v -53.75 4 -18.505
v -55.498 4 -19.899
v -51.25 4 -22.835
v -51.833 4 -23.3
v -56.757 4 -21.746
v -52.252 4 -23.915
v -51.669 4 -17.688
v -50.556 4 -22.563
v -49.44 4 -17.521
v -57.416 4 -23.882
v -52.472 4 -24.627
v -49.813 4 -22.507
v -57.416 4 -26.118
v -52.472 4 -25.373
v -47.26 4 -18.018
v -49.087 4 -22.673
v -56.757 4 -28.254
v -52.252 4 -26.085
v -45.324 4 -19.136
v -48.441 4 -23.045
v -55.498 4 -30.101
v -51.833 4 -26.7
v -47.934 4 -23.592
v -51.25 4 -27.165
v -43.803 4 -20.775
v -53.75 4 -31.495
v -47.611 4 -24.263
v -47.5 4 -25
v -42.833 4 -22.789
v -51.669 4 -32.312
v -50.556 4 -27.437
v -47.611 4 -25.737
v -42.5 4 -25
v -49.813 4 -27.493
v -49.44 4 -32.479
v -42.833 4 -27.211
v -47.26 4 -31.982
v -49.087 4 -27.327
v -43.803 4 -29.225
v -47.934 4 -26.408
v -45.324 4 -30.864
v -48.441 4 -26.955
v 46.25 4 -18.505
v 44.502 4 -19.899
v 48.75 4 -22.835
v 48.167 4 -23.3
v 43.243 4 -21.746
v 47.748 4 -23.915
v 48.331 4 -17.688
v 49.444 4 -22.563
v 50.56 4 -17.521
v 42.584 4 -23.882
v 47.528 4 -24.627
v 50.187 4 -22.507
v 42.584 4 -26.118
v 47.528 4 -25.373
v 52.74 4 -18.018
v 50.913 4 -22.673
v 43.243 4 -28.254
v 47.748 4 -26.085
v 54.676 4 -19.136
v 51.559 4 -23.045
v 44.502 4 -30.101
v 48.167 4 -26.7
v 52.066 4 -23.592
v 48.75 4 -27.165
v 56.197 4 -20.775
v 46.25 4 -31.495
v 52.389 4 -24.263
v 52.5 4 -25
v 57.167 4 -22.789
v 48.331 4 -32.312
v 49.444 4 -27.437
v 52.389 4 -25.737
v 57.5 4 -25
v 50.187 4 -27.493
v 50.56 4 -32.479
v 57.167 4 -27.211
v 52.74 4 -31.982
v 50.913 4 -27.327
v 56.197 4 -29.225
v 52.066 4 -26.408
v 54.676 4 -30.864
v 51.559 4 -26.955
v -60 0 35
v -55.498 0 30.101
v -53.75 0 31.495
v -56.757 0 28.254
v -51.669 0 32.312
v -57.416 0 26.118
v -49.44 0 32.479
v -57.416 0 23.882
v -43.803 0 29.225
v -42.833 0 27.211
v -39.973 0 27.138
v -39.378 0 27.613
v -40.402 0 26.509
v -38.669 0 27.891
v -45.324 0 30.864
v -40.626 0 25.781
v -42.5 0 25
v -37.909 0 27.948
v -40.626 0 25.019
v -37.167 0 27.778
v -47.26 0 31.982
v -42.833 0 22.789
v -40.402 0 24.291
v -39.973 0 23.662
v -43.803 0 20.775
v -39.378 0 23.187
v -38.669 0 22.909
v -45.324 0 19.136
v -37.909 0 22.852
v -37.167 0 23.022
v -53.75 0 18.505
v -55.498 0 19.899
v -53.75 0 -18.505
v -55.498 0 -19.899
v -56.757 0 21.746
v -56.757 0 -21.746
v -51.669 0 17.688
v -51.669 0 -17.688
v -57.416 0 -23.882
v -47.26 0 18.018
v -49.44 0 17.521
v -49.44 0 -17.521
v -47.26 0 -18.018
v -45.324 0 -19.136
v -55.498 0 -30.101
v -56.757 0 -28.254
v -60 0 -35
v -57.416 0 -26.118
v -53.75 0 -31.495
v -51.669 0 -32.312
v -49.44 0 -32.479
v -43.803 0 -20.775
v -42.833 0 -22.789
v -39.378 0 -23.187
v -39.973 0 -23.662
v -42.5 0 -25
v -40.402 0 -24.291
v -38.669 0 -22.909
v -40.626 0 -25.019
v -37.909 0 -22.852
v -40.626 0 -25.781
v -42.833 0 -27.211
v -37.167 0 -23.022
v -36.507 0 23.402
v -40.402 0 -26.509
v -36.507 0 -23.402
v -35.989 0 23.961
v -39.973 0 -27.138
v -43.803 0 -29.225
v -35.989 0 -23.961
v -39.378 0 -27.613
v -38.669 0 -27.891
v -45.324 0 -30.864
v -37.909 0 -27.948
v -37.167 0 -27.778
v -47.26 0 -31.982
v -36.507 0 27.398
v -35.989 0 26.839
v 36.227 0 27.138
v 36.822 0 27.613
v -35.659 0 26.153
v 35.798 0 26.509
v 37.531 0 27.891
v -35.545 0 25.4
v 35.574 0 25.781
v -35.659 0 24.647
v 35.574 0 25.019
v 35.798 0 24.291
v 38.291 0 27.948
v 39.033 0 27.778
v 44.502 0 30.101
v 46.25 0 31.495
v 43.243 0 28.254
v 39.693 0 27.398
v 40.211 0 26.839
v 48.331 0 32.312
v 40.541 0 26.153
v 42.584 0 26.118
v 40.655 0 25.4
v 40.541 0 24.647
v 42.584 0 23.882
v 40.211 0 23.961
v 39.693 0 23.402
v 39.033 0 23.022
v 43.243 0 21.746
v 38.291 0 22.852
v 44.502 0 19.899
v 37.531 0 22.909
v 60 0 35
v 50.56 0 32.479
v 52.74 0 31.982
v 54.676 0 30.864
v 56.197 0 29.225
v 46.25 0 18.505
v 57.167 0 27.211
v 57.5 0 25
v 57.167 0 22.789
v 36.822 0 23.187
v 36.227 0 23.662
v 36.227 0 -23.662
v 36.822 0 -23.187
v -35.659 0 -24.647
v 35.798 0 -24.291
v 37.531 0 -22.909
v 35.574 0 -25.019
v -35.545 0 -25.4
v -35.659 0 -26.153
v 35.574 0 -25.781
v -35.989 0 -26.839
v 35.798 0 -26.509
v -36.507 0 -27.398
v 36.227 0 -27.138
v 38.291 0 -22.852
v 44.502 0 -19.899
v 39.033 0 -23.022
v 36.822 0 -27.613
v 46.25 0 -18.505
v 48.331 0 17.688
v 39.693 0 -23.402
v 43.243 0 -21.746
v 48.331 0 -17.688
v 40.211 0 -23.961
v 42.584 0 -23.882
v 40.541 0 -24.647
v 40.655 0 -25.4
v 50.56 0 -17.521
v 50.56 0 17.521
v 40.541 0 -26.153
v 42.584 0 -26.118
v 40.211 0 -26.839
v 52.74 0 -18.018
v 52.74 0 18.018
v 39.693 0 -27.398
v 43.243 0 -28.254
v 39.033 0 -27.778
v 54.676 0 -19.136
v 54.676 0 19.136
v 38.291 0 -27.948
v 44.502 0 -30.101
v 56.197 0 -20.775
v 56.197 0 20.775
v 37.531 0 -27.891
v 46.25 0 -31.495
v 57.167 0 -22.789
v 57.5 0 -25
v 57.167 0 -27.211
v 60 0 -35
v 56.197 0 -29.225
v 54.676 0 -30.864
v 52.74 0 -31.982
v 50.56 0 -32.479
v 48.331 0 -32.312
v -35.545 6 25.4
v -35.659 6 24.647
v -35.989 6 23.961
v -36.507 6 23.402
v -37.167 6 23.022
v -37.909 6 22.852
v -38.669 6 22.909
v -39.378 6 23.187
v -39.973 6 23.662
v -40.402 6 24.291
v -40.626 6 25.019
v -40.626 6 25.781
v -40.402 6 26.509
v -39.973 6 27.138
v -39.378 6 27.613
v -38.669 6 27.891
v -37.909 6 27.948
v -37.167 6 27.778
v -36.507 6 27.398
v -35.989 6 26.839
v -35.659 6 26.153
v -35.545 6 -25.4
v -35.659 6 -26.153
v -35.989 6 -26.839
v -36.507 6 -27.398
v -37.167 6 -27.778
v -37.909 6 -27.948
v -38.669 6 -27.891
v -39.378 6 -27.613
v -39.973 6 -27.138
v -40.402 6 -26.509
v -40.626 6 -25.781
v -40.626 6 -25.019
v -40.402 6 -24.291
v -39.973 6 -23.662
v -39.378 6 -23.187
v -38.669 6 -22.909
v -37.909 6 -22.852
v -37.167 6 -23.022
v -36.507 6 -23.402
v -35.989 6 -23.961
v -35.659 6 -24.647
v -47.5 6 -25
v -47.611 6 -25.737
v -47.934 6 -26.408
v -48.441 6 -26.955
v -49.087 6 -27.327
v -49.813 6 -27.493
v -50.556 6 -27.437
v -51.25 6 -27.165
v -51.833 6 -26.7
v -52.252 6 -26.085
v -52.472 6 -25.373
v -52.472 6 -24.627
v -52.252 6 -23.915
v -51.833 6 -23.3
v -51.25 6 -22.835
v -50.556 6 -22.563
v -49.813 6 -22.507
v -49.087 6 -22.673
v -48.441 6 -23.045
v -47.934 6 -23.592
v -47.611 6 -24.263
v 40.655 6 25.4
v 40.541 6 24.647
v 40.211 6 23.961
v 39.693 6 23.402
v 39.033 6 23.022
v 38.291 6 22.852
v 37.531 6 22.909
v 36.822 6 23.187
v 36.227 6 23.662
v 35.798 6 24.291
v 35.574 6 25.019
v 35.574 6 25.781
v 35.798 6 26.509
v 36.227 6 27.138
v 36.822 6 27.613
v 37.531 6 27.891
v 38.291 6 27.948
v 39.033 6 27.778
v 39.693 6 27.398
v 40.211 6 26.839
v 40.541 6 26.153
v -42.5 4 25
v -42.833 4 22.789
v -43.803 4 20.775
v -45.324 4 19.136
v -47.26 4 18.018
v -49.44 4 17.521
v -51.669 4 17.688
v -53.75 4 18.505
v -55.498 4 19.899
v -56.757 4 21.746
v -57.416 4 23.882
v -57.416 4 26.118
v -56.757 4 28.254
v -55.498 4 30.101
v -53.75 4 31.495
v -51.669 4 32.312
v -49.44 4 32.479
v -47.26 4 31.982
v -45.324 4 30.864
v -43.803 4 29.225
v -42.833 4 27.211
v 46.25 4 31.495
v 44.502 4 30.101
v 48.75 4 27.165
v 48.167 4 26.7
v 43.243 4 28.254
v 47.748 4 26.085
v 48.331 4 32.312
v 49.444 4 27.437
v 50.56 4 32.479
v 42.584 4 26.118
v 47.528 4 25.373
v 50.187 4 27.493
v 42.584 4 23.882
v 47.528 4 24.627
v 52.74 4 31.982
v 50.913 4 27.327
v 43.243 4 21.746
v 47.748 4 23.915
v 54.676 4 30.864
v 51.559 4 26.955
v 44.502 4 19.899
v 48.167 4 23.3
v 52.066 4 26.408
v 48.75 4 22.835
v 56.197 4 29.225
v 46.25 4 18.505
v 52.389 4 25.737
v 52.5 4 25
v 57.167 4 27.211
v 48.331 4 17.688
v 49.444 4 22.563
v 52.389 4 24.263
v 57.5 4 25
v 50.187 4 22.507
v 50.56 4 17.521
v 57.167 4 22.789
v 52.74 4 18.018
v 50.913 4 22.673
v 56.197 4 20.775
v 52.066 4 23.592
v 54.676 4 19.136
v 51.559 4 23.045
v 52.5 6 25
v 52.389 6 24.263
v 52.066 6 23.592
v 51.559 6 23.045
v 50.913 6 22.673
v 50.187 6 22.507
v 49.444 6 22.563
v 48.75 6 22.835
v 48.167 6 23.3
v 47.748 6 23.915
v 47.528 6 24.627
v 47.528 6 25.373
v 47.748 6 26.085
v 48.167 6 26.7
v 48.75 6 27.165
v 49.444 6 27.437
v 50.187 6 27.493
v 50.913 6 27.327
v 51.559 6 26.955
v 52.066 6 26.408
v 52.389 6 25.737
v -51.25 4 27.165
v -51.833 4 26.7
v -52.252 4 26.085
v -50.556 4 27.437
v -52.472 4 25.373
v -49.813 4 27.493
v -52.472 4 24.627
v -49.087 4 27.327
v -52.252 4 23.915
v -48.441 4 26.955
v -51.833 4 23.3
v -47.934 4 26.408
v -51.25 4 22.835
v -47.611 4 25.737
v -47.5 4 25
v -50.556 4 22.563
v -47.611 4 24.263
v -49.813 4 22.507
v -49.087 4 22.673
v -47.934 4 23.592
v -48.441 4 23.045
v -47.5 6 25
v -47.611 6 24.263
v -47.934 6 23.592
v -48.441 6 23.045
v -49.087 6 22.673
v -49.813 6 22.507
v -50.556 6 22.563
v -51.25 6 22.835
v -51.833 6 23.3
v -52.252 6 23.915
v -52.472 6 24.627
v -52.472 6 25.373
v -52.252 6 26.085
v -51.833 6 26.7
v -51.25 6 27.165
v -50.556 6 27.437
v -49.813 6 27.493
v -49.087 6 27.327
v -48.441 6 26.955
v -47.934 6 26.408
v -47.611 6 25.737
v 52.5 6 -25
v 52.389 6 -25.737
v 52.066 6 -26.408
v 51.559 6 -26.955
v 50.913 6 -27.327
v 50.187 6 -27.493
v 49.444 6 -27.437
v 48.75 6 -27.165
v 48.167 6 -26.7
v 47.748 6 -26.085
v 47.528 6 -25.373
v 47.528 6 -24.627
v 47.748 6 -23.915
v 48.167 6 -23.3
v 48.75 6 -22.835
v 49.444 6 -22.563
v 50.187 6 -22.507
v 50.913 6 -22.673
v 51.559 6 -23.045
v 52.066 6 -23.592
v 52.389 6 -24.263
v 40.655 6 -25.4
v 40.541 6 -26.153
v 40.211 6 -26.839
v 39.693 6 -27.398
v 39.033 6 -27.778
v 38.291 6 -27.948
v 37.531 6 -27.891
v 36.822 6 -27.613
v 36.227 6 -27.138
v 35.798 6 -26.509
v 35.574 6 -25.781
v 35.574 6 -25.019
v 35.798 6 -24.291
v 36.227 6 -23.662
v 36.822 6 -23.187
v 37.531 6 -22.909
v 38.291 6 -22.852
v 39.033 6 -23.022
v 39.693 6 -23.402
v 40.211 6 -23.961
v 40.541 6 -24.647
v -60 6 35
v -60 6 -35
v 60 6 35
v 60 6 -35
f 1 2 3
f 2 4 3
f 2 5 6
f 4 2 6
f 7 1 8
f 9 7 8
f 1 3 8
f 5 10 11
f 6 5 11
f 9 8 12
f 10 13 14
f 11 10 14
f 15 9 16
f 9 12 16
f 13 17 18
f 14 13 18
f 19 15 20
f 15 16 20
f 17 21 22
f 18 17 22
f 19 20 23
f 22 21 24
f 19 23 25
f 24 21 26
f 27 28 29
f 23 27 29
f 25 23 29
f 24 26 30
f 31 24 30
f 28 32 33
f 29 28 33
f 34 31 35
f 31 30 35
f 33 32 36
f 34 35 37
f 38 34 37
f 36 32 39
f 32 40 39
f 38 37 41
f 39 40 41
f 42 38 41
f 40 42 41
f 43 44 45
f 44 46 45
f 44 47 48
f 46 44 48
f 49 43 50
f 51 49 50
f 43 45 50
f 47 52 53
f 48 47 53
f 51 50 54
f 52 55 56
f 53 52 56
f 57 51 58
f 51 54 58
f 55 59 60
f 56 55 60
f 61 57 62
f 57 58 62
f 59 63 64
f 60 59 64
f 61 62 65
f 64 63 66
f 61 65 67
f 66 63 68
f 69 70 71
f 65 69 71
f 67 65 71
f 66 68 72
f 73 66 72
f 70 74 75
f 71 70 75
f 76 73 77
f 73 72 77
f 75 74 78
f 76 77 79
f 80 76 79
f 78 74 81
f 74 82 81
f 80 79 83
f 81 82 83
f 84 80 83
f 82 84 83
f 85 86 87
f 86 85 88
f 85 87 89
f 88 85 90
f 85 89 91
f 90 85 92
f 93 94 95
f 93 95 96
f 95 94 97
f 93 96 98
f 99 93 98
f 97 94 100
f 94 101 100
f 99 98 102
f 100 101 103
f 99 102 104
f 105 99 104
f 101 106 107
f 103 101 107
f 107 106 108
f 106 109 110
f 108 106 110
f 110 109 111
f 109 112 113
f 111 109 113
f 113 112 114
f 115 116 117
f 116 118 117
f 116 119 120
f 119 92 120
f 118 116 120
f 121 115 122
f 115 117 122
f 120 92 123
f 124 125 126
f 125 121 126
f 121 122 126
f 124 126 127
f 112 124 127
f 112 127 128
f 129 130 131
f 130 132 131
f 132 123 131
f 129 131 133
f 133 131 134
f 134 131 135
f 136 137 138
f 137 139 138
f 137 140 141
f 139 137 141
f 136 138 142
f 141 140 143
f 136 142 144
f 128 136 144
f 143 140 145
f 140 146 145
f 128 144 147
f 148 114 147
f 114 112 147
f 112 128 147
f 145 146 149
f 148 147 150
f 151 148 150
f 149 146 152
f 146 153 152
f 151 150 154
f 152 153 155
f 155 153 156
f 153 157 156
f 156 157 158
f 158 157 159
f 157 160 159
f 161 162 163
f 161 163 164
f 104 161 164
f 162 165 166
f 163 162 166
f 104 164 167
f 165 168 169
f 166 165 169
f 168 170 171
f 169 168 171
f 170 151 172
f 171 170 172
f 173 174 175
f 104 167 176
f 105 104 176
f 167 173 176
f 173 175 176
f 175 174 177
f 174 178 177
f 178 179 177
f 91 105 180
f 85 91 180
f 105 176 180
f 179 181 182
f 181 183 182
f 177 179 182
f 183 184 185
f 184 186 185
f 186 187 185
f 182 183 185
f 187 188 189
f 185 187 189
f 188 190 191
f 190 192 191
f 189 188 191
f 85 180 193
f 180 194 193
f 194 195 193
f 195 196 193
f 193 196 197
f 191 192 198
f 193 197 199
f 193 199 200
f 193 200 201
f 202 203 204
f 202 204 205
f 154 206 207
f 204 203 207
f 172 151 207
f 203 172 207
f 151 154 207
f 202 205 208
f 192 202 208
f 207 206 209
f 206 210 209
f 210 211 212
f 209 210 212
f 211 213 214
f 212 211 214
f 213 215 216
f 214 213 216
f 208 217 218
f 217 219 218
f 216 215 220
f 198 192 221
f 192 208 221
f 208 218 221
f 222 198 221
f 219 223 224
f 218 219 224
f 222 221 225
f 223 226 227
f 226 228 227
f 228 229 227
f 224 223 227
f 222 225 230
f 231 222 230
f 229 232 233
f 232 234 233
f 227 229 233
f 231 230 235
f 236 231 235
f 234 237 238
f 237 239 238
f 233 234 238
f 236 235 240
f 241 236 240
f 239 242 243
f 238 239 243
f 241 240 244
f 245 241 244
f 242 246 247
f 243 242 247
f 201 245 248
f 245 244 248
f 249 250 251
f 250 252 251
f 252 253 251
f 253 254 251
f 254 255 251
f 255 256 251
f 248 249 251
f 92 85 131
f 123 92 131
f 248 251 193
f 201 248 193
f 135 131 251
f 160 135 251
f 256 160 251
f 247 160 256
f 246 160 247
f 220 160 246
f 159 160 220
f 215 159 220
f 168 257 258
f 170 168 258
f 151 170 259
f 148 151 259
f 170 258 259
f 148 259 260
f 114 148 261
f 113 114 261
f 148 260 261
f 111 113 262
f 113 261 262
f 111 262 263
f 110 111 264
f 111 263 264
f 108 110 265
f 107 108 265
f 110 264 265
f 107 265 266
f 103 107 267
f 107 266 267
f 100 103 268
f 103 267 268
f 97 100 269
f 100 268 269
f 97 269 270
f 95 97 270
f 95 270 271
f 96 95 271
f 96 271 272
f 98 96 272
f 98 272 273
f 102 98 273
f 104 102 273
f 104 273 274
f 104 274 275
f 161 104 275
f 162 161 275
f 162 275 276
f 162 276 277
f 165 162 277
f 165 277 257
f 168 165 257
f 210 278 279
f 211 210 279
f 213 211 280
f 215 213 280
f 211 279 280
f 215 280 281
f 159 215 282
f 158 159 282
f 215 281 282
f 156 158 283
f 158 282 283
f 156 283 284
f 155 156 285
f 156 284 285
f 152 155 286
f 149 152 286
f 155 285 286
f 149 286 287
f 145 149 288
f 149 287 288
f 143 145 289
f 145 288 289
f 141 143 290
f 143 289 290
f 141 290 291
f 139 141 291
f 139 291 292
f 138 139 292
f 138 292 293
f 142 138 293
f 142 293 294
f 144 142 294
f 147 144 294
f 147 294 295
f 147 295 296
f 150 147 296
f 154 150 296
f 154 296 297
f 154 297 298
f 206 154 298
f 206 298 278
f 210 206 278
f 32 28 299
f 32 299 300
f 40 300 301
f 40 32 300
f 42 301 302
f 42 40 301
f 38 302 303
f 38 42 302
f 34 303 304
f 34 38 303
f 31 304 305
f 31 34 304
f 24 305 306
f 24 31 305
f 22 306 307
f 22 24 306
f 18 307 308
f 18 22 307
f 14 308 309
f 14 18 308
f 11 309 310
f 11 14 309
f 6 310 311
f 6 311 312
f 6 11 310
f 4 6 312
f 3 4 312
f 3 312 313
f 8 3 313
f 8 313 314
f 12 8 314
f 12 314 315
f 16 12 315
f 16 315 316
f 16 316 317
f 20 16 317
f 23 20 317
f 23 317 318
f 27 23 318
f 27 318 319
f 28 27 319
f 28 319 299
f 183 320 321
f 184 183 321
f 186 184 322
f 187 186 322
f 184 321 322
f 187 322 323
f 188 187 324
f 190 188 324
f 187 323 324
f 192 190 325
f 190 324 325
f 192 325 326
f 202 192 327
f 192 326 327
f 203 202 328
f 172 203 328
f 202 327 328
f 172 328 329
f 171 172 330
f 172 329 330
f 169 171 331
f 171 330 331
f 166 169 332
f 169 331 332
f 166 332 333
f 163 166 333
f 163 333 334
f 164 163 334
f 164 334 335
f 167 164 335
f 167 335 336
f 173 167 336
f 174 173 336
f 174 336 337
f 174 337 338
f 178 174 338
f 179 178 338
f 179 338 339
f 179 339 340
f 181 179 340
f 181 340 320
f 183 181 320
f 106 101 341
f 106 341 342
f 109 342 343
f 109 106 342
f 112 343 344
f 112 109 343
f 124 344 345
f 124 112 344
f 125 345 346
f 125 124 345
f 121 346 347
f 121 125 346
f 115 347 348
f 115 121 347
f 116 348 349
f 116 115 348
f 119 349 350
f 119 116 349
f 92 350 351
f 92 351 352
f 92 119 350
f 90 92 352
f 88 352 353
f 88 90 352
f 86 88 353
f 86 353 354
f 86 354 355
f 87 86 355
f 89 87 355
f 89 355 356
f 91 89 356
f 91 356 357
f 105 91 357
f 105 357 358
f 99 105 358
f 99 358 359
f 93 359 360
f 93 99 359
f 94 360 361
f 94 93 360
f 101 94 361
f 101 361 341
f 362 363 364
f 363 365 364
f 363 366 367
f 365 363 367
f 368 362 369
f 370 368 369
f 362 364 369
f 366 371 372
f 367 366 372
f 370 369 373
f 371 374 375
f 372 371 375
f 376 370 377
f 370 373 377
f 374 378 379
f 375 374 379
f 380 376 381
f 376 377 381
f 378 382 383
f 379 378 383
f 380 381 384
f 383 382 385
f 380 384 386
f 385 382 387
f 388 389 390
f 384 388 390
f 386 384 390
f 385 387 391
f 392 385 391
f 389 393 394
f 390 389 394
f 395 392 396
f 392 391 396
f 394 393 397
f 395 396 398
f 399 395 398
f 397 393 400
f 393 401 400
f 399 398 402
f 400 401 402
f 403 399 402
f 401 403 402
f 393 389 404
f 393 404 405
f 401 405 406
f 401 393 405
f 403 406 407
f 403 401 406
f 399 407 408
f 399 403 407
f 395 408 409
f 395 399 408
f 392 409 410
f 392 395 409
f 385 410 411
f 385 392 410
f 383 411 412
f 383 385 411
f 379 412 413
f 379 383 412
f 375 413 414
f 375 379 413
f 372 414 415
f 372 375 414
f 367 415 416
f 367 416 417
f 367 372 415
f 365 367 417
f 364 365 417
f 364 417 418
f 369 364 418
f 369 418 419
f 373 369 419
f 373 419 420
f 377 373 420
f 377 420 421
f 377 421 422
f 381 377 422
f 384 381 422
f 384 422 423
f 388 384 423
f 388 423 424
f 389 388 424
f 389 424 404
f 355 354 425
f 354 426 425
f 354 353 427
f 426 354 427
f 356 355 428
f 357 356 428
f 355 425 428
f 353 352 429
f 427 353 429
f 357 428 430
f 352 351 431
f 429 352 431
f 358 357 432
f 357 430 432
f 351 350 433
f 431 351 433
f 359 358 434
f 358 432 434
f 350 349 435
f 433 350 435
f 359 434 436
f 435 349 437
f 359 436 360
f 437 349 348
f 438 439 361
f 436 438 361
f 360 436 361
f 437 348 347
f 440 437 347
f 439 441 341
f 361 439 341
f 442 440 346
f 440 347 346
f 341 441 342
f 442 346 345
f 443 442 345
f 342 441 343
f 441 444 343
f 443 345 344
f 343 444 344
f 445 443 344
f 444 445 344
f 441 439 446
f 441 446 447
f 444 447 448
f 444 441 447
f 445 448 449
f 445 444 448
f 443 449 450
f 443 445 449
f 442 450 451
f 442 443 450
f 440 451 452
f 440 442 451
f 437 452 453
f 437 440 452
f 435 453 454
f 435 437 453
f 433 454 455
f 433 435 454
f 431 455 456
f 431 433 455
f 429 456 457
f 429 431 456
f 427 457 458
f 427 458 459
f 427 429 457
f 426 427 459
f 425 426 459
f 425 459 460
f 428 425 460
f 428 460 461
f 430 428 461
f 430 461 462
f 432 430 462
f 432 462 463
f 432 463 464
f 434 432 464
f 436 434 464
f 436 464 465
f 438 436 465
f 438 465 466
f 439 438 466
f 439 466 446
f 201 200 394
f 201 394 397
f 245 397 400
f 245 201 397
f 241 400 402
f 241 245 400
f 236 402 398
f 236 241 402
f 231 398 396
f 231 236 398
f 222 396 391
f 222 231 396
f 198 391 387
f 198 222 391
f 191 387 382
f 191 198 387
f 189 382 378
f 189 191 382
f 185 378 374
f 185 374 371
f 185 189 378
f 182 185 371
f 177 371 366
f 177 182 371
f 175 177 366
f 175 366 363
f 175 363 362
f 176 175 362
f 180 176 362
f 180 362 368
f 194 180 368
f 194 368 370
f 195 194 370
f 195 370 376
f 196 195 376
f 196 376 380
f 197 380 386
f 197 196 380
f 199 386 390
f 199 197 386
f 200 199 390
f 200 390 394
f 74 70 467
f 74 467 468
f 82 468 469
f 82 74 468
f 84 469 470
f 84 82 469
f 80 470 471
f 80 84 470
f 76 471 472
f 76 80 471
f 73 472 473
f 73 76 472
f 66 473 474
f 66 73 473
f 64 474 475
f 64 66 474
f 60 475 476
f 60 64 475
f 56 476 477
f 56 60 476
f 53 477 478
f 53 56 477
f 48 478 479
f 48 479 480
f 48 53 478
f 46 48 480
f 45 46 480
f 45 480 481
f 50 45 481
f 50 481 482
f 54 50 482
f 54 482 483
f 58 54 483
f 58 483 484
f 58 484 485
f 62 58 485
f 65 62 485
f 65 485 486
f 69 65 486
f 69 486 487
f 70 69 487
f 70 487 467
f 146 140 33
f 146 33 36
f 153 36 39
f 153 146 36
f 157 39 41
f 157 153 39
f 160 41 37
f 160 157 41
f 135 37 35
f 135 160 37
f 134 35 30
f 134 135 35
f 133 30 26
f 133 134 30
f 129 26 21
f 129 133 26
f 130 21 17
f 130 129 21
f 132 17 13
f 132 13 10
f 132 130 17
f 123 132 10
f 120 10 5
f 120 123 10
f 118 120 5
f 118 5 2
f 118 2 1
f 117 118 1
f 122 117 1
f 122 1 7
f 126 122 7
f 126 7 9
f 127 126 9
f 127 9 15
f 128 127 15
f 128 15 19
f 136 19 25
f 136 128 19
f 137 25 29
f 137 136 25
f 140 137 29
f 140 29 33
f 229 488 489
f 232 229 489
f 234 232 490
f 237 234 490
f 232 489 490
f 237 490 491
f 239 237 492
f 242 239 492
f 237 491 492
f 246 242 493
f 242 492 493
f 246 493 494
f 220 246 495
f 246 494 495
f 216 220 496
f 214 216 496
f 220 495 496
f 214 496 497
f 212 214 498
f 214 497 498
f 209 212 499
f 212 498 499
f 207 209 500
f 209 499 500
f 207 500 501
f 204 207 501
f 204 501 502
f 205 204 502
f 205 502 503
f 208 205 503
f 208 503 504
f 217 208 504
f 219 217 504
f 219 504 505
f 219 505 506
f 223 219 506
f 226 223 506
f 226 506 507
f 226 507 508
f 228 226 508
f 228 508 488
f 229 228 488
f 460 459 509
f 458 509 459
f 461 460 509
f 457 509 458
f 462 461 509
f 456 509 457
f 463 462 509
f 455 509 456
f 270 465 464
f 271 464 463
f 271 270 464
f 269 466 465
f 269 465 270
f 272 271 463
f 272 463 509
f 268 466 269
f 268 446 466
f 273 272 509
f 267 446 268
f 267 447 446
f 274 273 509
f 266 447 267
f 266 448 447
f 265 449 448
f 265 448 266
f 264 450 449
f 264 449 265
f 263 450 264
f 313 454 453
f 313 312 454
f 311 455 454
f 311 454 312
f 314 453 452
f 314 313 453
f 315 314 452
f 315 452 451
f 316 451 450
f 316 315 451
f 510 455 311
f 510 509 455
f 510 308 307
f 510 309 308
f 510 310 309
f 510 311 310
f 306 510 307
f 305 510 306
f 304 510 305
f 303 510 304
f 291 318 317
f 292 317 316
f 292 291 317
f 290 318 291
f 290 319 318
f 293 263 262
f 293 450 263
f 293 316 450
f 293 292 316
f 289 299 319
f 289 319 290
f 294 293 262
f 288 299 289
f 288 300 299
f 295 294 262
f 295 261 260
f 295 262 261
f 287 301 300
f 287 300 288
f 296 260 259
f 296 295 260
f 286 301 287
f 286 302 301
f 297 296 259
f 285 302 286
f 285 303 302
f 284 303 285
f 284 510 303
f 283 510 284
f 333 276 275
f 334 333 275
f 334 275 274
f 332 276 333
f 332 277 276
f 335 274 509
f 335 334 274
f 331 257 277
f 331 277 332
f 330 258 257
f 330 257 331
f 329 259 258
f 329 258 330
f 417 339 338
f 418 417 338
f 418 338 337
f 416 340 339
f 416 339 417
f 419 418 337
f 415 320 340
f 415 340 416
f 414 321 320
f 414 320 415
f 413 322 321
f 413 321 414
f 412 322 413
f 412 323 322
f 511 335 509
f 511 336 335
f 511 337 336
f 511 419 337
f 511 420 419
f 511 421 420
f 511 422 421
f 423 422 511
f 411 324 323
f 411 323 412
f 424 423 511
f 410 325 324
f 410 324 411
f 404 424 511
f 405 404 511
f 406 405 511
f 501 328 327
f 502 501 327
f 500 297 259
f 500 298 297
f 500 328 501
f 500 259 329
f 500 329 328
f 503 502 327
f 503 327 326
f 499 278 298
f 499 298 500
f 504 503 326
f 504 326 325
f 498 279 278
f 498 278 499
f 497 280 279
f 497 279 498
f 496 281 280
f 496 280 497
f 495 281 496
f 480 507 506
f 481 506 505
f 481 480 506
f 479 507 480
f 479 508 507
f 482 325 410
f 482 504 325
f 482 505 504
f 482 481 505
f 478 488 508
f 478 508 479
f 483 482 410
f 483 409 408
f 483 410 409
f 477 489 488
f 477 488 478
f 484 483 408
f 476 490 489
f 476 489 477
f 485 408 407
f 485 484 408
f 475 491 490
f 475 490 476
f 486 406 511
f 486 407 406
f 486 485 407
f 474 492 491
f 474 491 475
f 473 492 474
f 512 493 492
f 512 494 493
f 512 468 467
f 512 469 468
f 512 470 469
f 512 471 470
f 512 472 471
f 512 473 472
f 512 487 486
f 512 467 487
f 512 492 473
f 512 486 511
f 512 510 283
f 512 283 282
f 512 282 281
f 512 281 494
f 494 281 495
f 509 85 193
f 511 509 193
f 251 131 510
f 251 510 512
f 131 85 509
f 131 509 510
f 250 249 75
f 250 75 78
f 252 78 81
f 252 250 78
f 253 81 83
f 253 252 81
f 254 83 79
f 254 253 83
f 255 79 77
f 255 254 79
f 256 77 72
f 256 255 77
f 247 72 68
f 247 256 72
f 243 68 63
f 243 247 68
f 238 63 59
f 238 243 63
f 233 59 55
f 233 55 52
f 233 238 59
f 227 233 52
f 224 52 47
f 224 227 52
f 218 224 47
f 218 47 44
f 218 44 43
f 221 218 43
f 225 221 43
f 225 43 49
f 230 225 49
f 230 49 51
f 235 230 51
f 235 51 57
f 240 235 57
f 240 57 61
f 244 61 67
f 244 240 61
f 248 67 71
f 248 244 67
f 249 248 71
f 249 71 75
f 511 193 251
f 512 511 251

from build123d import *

# Parameters (mm, degrees)
SKETCH1_W           = 120
SKETCH1_H           = 70
SKETCH1_R           = 2.5
BOSS_EXTRUDE1_DEPTH = 6
SKETCH2_R           = 2.555
CUT_EXTRUDE1_DEPTH  = 7
SKETCH3_R           = 7.5
CUT_EXTRUDE2_DEPTH  = 4


with BuildPart() as part:
    # Sketch1 → Boss-Extrude1 (new body)
    with BuildSketch(Plane(origin=(0, 0, 0), x_dir=(1, 0, 0), z_dir=(0, 1, 0))):
        Rectangle(SKETCH1_W, SKETCH1_H)
        with Locations((-50, -25)):
            Circle(SKETCH1_R, mode=Mode.SUBTRACT)
        with Locations((-50, 25)):
            Circle(SKETCH1_R, mode=Mode.SUBTRACT)
        with Locations((50, 25)):
            Circle(SKETCH1_R, mode=Mode.SUBTRACT)
        with Locations((50, -25)):
            Circle(SKETCH1_R, mode=Mode.SUBTRACT)
    extrude(amount=BOSS_EXTRUDE1_DEPTH)

    # Sketch2 → Cut-Extrude1 (cut, through all)
    with BuildSketch(Plane(origin=(0, 6, 0), x_dir=(1, 0, 0), z_dir=(0, 1, 0))):
        with Locations((38.1, -25.4)):
            Circle(SKETCH2_R)
        with Locations((-38.1, -25.4)):
            Circle(SKETCH2_R)
        with Locations((38.1, 25.4)):
            Circle(SKETCH2_R)
        with Locations((-38.1, 25.4)):
            Circle(SKETCH2_R)
    extrude(amount=-CUT_EXTRUDE1_DEPTH, mode=Mode.SUBTRACT)

    # Sketch3 → Cut-Extrude2 (cut)
    with BuildSketch(Plane(origin=(0, 0, 0), x_dir=(1, 0, 0), z_dir=(0, 1, 0))):
        with Locations((-50, 25)):
            Circle(SKETCH3_R)
        with Locations((50, 25)):
            Circle(SKETCH3_R)
        with Locations((50, -25)):
            Circle(SKETCH3_R)
        with Locations((-50, -25)):
            Circle(SKETCH3_R)
    extrude(amount=CUT_EXTRUDE2_DEPTH, mode=Mode.SUBTRACT)


solid = part.part
